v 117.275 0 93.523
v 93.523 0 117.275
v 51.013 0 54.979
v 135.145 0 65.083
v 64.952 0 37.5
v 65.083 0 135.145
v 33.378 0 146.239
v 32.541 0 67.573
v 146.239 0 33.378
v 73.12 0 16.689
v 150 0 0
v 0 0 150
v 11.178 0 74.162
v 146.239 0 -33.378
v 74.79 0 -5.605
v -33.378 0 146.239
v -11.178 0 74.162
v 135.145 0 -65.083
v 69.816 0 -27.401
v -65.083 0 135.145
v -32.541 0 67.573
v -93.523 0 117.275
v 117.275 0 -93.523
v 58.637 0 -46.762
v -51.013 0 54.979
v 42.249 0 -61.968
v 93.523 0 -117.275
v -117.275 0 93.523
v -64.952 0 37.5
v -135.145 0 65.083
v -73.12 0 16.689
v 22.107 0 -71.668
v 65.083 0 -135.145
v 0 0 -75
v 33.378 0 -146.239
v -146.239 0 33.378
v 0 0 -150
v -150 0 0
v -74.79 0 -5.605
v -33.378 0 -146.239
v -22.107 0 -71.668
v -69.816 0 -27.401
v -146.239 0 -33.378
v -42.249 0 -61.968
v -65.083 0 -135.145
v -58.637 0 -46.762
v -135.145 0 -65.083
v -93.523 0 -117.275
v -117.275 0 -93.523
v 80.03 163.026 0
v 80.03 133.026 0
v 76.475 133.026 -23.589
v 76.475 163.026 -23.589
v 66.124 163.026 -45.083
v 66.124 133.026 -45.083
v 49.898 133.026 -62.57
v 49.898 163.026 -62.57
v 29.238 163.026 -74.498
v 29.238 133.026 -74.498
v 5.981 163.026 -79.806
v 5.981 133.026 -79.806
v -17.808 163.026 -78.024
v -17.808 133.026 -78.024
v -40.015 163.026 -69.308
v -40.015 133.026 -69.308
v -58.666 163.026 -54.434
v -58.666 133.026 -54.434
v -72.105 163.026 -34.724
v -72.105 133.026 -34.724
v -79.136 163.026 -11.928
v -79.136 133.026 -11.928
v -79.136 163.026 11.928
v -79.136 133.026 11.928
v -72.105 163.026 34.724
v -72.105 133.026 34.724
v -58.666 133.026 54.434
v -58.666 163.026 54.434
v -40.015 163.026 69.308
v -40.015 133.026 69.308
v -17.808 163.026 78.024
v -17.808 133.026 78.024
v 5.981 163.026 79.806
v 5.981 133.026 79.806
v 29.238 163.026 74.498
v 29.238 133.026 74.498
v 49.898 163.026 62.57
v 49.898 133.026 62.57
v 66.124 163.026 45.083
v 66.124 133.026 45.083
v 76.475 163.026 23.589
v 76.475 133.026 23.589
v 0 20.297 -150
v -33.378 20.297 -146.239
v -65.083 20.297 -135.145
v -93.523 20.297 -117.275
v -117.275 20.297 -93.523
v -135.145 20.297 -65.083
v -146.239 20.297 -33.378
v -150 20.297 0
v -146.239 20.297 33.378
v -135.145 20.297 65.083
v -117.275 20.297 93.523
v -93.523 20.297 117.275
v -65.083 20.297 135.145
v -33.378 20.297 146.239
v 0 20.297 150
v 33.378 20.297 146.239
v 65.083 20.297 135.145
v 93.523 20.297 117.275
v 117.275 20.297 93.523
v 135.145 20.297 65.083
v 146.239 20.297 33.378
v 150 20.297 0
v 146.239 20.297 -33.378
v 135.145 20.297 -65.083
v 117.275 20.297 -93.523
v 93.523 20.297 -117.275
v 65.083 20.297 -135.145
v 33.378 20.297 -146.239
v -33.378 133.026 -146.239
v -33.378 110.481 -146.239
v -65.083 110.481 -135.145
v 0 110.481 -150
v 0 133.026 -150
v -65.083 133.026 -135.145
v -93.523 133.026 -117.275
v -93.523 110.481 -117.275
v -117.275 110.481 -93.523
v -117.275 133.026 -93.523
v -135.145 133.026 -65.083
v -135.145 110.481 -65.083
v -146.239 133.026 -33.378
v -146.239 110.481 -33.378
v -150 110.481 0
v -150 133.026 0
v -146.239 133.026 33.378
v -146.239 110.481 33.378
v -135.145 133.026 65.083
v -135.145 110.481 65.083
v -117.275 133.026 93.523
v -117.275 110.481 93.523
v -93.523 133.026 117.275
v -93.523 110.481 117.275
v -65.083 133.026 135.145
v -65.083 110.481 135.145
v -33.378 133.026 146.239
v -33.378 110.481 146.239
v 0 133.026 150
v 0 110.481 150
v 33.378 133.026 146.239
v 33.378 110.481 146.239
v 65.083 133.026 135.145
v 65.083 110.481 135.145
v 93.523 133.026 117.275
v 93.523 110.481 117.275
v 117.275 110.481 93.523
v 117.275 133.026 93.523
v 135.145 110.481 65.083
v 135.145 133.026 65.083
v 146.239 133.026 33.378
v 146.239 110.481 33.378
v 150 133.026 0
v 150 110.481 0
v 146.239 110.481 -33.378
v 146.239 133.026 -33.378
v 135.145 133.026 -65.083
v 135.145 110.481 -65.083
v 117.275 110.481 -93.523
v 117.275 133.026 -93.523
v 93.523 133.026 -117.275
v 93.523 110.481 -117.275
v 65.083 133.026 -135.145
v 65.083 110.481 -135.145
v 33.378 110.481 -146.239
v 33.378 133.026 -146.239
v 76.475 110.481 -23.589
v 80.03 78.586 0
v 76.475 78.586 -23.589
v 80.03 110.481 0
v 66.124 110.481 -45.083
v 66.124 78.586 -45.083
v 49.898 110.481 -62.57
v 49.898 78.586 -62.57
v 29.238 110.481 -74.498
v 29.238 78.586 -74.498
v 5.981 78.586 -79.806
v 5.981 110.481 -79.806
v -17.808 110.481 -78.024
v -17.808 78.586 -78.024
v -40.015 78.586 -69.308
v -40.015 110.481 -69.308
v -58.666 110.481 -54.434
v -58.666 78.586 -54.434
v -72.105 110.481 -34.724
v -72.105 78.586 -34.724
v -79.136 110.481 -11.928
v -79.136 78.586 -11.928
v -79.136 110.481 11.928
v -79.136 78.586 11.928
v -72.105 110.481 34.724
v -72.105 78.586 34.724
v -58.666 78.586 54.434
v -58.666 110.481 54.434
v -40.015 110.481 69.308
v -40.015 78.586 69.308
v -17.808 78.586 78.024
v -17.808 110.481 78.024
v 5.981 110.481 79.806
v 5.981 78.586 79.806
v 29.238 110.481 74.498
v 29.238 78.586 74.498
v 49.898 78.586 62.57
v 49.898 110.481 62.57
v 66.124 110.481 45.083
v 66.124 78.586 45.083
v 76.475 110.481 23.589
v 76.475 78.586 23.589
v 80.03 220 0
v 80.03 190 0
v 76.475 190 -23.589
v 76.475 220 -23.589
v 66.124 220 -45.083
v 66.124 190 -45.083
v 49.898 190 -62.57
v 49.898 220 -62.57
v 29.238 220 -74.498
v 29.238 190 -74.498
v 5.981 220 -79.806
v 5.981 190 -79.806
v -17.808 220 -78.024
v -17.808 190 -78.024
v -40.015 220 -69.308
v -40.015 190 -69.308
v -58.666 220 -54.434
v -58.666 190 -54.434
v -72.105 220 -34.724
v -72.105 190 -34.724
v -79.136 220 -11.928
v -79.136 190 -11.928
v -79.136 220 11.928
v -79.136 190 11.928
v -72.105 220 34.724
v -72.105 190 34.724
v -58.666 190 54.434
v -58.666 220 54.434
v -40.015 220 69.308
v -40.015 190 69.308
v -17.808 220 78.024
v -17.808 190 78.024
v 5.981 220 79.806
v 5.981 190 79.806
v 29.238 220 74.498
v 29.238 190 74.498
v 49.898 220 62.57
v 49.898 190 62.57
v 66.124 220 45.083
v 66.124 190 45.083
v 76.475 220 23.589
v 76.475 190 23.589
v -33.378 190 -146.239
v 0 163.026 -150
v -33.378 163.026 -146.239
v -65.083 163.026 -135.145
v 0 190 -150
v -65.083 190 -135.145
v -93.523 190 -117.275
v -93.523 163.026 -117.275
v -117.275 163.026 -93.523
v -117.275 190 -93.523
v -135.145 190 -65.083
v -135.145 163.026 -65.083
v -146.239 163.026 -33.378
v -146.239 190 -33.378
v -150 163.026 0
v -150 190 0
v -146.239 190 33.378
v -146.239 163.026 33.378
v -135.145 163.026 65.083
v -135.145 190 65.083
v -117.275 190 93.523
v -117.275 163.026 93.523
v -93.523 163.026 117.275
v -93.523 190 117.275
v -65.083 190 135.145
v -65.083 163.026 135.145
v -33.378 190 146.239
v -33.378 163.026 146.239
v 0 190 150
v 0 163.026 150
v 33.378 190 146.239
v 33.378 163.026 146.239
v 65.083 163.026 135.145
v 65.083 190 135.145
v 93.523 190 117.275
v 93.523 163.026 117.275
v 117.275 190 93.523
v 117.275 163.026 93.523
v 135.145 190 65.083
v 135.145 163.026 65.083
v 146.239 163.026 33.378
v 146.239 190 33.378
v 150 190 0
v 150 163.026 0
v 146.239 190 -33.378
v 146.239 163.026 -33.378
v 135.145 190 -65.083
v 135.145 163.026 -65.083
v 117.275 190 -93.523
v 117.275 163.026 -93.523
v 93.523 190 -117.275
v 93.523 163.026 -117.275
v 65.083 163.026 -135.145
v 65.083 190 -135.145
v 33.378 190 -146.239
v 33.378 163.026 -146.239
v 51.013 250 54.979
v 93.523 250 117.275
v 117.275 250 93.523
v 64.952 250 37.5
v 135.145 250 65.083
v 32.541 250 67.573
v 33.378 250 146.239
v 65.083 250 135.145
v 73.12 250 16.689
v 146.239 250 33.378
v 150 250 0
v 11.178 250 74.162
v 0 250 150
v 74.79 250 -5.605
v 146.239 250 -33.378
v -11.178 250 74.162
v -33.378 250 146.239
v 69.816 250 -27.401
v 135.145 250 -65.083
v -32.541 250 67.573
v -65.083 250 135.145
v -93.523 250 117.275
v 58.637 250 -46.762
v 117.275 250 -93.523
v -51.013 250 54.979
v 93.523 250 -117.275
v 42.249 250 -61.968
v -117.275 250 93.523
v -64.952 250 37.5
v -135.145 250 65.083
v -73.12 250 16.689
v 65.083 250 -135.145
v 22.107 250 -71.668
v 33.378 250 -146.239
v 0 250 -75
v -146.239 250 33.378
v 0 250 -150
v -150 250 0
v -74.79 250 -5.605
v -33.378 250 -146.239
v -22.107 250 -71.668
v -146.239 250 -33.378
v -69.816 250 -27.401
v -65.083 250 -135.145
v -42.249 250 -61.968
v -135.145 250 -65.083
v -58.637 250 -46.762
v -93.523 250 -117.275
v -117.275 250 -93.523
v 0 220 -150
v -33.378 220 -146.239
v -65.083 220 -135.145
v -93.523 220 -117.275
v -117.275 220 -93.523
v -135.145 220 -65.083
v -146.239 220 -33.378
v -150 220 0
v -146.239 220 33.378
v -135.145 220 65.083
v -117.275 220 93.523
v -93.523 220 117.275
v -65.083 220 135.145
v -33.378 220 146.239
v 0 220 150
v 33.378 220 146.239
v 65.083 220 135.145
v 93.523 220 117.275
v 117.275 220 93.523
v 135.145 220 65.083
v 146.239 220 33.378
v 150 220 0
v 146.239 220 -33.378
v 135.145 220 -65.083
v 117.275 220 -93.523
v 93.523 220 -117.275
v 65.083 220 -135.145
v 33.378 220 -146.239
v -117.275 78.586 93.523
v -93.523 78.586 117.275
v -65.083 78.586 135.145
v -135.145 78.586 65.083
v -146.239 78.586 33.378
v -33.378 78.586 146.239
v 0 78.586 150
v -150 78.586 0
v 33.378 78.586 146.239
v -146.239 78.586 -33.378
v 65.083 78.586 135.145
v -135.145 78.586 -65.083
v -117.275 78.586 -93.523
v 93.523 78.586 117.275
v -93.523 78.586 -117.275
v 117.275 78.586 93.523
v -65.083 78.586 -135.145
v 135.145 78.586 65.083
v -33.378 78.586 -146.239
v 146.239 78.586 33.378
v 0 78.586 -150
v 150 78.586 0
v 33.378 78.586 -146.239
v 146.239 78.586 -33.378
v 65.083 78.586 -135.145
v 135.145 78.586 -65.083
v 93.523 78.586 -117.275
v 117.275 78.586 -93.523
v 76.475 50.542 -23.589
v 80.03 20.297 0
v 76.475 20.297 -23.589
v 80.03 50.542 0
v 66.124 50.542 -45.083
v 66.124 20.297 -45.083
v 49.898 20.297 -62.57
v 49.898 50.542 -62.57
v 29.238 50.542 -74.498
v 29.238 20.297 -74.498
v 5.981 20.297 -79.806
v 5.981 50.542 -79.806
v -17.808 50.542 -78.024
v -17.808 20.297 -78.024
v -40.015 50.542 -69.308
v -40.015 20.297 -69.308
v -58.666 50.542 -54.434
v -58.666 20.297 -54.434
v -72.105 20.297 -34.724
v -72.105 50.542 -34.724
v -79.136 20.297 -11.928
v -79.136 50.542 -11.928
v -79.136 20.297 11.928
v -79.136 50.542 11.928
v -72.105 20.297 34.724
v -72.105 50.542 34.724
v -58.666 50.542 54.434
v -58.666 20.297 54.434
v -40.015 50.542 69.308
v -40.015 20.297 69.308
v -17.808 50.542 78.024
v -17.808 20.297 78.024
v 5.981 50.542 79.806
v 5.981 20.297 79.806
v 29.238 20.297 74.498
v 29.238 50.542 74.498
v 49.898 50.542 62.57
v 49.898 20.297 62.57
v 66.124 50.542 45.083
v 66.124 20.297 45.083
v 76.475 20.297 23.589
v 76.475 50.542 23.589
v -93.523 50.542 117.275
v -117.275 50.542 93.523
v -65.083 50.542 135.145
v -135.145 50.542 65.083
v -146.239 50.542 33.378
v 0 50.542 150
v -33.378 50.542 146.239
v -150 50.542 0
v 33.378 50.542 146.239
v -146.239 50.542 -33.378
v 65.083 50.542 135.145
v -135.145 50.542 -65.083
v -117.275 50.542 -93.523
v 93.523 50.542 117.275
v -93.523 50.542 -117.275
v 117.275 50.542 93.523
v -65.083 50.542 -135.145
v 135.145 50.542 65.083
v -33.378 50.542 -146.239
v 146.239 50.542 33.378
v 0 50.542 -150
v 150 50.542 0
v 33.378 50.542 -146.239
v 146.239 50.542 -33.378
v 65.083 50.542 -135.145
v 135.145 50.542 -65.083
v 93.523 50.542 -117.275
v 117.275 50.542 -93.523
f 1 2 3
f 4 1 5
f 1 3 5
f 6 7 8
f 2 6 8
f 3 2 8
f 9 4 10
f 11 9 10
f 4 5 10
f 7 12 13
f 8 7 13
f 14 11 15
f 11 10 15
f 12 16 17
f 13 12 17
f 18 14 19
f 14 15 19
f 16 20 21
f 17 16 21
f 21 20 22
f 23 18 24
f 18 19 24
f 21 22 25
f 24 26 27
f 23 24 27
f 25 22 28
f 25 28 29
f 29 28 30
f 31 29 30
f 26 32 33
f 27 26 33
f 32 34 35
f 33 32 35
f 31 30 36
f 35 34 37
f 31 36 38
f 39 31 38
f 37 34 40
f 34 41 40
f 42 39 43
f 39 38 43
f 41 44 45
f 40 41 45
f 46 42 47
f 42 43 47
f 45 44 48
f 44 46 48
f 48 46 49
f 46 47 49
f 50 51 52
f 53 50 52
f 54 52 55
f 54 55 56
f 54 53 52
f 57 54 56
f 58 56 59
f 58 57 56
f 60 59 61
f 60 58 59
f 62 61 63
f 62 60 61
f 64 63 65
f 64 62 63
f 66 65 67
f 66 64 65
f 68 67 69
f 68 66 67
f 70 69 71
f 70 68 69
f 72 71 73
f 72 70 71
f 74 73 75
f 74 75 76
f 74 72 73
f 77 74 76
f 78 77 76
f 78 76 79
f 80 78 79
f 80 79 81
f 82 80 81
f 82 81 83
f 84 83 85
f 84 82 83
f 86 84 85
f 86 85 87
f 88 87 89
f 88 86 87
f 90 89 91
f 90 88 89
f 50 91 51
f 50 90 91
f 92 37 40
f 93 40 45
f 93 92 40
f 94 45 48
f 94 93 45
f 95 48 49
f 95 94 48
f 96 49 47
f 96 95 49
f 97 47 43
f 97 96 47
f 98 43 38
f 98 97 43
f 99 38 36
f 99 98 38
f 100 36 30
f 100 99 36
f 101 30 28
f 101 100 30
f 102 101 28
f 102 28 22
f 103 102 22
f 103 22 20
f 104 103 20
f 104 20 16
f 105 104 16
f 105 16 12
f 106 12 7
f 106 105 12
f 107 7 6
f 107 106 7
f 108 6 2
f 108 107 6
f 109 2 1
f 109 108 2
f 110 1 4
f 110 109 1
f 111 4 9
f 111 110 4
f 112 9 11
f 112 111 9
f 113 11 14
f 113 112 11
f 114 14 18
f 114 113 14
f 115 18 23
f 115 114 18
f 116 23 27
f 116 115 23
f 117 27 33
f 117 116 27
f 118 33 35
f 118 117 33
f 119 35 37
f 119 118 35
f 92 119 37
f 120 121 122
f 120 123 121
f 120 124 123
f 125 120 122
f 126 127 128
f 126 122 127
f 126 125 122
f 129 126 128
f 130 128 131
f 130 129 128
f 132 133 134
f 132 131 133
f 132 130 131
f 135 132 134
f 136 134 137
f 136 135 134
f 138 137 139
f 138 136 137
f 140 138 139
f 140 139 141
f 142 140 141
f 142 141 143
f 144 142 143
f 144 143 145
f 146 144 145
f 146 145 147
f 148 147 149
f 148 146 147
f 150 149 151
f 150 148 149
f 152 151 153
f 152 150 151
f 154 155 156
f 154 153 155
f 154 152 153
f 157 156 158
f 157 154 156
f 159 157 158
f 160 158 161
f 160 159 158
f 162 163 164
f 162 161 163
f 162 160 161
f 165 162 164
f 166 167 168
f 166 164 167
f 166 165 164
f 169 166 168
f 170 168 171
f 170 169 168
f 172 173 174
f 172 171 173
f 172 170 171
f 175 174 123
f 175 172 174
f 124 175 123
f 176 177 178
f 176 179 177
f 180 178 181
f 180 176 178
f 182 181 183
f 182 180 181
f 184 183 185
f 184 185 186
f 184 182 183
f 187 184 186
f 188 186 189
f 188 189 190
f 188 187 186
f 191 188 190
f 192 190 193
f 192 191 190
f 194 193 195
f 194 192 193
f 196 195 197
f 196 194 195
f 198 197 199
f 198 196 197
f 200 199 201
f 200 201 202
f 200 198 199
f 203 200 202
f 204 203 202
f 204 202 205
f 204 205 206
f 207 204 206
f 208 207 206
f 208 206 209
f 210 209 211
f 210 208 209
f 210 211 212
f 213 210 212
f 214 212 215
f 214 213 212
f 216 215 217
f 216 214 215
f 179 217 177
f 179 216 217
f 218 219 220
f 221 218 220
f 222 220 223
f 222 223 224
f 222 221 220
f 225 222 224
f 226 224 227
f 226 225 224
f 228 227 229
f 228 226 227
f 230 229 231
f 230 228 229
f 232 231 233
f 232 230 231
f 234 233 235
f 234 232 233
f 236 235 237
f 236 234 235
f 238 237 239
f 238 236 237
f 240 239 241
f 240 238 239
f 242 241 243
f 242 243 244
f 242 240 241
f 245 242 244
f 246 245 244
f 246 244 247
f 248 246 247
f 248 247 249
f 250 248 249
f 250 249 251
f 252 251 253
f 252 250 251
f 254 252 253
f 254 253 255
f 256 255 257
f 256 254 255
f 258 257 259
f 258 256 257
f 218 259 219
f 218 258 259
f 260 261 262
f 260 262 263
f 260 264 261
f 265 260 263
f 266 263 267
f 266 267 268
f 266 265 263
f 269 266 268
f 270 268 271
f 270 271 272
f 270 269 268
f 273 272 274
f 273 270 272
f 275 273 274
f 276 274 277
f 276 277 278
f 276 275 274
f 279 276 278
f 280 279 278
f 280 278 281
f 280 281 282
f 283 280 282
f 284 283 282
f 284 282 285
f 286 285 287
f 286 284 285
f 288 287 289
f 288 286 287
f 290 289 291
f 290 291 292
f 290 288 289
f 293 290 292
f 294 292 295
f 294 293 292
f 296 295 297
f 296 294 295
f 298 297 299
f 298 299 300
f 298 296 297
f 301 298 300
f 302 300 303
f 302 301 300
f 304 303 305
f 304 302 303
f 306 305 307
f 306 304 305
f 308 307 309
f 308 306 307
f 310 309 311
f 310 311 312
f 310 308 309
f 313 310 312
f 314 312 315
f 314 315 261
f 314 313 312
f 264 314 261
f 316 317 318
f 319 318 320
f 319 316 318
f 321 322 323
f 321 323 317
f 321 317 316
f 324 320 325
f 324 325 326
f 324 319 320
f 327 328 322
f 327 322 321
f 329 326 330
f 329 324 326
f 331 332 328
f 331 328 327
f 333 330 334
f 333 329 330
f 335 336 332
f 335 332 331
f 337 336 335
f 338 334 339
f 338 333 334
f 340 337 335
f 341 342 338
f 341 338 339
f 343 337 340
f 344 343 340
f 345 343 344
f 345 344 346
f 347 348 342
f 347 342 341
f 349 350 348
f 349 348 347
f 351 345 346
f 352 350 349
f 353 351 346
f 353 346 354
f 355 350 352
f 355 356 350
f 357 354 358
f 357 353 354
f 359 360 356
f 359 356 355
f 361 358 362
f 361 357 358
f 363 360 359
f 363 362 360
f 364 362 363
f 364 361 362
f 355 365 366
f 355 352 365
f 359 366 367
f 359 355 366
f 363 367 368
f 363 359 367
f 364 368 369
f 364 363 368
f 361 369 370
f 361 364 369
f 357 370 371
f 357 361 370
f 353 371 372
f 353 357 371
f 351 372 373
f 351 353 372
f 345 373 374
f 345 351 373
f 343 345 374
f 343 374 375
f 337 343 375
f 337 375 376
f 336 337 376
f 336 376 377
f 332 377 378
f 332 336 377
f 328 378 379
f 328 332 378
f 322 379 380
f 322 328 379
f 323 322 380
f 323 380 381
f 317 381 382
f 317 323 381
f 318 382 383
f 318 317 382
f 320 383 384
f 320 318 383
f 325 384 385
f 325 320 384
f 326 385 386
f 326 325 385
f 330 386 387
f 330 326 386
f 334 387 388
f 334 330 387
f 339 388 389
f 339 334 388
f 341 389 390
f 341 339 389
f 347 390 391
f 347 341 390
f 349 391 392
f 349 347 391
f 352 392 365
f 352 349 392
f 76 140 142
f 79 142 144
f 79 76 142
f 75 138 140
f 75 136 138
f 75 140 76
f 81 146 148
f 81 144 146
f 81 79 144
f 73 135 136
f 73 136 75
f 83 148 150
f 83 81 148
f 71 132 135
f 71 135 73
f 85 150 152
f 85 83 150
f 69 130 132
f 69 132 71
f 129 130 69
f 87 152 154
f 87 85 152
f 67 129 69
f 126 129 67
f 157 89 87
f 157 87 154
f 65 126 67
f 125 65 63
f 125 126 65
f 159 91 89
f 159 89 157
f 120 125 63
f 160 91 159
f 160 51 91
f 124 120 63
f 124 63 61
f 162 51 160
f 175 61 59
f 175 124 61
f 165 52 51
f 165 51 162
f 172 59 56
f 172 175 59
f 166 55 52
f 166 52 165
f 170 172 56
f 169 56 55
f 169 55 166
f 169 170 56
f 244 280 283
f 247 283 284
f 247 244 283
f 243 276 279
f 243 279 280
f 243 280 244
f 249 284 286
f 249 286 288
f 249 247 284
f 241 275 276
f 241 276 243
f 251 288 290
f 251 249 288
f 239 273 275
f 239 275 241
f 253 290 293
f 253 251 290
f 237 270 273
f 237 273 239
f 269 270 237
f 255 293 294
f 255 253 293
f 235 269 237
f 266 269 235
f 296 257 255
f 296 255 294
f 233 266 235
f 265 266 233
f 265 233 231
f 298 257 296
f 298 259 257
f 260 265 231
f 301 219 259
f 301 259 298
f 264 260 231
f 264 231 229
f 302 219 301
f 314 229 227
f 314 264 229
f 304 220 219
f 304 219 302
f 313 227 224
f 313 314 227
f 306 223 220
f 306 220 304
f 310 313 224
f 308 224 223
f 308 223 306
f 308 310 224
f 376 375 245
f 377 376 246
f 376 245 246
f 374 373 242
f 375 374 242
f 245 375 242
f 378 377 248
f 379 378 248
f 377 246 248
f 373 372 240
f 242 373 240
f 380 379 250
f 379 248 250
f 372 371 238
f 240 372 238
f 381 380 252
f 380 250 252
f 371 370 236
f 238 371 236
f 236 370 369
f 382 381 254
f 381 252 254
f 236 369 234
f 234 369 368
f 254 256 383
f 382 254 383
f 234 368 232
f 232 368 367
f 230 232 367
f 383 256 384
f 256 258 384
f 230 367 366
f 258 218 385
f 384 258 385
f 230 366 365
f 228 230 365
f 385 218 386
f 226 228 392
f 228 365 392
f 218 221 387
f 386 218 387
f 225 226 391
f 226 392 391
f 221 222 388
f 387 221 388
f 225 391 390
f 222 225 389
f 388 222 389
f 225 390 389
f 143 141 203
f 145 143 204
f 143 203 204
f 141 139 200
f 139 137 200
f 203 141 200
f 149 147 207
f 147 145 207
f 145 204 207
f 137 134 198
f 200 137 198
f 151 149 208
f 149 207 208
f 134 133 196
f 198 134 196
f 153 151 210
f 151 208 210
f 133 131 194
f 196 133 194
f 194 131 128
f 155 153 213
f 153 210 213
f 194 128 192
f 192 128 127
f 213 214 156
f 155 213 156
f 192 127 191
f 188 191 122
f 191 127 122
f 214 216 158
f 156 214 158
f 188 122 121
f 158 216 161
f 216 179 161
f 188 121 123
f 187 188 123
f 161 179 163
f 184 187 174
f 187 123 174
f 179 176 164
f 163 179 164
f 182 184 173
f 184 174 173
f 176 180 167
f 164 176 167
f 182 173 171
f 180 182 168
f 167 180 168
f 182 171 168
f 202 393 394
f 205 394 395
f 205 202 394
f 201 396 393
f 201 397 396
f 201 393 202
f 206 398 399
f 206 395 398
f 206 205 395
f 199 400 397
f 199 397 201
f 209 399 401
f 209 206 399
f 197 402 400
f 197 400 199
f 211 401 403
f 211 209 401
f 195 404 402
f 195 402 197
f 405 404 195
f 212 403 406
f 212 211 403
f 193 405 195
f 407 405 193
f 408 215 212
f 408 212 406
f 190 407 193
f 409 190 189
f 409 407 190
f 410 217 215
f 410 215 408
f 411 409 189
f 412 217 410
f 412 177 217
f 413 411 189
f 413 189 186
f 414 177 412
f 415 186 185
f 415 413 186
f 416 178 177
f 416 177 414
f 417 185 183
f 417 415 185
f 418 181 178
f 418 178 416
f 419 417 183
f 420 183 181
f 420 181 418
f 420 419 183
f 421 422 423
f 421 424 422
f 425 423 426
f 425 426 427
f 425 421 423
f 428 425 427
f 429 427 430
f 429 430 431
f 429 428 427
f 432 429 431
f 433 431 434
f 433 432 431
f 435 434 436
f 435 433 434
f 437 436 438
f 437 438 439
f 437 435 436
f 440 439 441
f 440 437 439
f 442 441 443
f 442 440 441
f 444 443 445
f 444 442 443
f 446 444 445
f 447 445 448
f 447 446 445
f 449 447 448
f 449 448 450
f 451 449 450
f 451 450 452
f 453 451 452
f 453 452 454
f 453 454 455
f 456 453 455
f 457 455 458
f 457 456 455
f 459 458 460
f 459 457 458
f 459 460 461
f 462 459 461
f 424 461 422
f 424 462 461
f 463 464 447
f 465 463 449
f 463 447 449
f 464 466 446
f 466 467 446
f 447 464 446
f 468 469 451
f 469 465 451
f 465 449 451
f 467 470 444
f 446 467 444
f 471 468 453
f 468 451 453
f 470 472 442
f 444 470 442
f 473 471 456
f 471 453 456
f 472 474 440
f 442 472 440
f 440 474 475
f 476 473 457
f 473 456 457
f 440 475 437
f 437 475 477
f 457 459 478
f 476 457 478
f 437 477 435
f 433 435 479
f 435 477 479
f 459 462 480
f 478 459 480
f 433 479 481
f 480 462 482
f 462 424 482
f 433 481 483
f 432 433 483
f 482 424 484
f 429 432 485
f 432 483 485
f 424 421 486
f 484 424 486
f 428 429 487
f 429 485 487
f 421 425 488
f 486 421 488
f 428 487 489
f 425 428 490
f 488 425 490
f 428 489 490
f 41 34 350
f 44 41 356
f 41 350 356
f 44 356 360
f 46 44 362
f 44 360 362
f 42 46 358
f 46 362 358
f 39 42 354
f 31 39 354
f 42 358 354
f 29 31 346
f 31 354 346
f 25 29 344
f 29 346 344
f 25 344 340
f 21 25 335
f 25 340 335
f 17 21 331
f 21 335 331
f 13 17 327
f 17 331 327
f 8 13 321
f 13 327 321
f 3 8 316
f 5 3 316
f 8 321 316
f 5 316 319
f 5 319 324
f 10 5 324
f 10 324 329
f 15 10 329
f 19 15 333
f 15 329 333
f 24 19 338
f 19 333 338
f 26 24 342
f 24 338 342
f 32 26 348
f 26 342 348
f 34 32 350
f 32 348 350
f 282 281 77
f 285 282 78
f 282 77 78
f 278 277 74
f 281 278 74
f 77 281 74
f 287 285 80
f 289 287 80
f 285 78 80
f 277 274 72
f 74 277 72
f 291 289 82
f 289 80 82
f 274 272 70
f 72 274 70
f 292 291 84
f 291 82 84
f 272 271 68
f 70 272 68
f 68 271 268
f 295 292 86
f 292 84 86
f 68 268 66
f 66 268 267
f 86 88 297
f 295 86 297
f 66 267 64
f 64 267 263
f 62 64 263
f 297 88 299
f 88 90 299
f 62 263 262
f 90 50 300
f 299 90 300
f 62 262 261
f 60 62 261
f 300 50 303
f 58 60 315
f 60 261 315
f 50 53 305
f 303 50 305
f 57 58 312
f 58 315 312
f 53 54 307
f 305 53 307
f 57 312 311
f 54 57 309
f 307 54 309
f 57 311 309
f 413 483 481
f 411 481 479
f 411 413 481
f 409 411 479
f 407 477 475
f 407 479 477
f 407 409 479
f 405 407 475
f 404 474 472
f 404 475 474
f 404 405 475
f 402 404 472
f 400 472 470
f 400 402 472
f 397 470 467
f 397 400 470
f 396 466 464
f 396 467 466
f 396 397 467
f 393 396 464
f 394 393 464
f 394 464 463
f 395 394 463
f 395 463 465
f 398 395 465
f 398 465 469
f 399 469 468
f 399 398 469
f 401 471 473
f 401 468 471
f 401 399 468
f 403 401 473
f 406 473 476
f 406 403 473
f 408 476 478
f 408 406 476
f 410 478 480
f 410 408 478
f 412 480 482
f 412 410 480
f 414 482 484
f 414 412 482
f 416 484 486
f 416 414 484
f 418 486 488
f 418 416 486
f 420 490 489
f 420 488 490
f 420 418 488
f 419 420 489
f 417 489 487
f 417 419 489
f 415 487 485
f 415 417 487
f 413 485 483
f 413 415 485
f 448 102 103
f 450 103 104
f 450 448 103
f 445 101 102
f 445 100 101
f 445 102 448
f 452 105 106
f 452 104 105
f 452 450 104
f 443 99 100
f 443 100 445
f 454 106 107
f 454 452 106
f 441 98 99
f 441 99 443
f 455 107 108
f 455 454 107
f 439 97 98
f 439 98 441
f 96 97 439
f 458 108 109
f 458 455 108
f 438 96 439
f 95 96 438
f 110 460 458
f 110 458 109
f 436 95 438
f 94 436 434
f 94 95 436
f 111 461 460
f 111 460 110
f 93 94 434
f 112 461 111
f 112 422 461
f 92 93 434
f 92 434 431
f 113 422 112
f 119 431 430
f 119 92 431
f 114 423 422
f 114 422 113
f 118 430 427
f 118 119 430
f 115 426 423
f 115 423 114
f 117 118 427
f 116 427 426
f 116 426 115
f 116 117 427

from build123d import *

# Parameters (mm, degrees)
SKETCH1_W   = 75
SKETCH1_H   = 250
SKETCH2_W   = 69.969867672
SKETCH2_H   = 30
SKETCH2_H_2 = 31.89416608
SKETCH2_H_3 = 30.244467835


with BuildPart() as part:
    # Sketch1 → Revolve1 (revolve)
    with BuildSketch(Plane.XY, mode=Mode.PRIVATE) as revolve1_sk:
        with Locations((-112.5, 125)):
            Rectangle(SKETCH1_W, SKETCH1_H)
    revolve(revolve1_sk.sketch.rotate(Axis((0, 0, 0), (0, 1, 0)), 270), axis=Axis((0, 0, 0), (0, 1, 0)))

    # Sketch2 → Cut-Revolve2 (revolve, cut)
    with BuildSketch(Plane.XY, mode=Mode.PRIVATE) as cut_revolve2_sk:
        with Locations((-115.015066164, 205)):
            Rectangle(SKETCH2_W, SKETCH2_H)
        with Locations((-115.015066164, 148.026485549)):
            Rectangle(SKETCH2_W, SKETCH2_H)
        with Locations((-115.015066164, 94.533526487)):
            Rectangle(SKETCH2_W, SKETCH2_H_2)
        with Locations((-115.015066164, 35.419339356)):
            Rectangle(SKETCH2_W, SKETCH2_H_3)
    revolve(cut_revolve2_sk.sketch.rotate(Axis((0, 0, 0), (0, 1, 0)), 180), axis=Axis((0, 0, 0), (0, 1, 0)), mode=Mode.SUBTRACT)


solid = part.part
